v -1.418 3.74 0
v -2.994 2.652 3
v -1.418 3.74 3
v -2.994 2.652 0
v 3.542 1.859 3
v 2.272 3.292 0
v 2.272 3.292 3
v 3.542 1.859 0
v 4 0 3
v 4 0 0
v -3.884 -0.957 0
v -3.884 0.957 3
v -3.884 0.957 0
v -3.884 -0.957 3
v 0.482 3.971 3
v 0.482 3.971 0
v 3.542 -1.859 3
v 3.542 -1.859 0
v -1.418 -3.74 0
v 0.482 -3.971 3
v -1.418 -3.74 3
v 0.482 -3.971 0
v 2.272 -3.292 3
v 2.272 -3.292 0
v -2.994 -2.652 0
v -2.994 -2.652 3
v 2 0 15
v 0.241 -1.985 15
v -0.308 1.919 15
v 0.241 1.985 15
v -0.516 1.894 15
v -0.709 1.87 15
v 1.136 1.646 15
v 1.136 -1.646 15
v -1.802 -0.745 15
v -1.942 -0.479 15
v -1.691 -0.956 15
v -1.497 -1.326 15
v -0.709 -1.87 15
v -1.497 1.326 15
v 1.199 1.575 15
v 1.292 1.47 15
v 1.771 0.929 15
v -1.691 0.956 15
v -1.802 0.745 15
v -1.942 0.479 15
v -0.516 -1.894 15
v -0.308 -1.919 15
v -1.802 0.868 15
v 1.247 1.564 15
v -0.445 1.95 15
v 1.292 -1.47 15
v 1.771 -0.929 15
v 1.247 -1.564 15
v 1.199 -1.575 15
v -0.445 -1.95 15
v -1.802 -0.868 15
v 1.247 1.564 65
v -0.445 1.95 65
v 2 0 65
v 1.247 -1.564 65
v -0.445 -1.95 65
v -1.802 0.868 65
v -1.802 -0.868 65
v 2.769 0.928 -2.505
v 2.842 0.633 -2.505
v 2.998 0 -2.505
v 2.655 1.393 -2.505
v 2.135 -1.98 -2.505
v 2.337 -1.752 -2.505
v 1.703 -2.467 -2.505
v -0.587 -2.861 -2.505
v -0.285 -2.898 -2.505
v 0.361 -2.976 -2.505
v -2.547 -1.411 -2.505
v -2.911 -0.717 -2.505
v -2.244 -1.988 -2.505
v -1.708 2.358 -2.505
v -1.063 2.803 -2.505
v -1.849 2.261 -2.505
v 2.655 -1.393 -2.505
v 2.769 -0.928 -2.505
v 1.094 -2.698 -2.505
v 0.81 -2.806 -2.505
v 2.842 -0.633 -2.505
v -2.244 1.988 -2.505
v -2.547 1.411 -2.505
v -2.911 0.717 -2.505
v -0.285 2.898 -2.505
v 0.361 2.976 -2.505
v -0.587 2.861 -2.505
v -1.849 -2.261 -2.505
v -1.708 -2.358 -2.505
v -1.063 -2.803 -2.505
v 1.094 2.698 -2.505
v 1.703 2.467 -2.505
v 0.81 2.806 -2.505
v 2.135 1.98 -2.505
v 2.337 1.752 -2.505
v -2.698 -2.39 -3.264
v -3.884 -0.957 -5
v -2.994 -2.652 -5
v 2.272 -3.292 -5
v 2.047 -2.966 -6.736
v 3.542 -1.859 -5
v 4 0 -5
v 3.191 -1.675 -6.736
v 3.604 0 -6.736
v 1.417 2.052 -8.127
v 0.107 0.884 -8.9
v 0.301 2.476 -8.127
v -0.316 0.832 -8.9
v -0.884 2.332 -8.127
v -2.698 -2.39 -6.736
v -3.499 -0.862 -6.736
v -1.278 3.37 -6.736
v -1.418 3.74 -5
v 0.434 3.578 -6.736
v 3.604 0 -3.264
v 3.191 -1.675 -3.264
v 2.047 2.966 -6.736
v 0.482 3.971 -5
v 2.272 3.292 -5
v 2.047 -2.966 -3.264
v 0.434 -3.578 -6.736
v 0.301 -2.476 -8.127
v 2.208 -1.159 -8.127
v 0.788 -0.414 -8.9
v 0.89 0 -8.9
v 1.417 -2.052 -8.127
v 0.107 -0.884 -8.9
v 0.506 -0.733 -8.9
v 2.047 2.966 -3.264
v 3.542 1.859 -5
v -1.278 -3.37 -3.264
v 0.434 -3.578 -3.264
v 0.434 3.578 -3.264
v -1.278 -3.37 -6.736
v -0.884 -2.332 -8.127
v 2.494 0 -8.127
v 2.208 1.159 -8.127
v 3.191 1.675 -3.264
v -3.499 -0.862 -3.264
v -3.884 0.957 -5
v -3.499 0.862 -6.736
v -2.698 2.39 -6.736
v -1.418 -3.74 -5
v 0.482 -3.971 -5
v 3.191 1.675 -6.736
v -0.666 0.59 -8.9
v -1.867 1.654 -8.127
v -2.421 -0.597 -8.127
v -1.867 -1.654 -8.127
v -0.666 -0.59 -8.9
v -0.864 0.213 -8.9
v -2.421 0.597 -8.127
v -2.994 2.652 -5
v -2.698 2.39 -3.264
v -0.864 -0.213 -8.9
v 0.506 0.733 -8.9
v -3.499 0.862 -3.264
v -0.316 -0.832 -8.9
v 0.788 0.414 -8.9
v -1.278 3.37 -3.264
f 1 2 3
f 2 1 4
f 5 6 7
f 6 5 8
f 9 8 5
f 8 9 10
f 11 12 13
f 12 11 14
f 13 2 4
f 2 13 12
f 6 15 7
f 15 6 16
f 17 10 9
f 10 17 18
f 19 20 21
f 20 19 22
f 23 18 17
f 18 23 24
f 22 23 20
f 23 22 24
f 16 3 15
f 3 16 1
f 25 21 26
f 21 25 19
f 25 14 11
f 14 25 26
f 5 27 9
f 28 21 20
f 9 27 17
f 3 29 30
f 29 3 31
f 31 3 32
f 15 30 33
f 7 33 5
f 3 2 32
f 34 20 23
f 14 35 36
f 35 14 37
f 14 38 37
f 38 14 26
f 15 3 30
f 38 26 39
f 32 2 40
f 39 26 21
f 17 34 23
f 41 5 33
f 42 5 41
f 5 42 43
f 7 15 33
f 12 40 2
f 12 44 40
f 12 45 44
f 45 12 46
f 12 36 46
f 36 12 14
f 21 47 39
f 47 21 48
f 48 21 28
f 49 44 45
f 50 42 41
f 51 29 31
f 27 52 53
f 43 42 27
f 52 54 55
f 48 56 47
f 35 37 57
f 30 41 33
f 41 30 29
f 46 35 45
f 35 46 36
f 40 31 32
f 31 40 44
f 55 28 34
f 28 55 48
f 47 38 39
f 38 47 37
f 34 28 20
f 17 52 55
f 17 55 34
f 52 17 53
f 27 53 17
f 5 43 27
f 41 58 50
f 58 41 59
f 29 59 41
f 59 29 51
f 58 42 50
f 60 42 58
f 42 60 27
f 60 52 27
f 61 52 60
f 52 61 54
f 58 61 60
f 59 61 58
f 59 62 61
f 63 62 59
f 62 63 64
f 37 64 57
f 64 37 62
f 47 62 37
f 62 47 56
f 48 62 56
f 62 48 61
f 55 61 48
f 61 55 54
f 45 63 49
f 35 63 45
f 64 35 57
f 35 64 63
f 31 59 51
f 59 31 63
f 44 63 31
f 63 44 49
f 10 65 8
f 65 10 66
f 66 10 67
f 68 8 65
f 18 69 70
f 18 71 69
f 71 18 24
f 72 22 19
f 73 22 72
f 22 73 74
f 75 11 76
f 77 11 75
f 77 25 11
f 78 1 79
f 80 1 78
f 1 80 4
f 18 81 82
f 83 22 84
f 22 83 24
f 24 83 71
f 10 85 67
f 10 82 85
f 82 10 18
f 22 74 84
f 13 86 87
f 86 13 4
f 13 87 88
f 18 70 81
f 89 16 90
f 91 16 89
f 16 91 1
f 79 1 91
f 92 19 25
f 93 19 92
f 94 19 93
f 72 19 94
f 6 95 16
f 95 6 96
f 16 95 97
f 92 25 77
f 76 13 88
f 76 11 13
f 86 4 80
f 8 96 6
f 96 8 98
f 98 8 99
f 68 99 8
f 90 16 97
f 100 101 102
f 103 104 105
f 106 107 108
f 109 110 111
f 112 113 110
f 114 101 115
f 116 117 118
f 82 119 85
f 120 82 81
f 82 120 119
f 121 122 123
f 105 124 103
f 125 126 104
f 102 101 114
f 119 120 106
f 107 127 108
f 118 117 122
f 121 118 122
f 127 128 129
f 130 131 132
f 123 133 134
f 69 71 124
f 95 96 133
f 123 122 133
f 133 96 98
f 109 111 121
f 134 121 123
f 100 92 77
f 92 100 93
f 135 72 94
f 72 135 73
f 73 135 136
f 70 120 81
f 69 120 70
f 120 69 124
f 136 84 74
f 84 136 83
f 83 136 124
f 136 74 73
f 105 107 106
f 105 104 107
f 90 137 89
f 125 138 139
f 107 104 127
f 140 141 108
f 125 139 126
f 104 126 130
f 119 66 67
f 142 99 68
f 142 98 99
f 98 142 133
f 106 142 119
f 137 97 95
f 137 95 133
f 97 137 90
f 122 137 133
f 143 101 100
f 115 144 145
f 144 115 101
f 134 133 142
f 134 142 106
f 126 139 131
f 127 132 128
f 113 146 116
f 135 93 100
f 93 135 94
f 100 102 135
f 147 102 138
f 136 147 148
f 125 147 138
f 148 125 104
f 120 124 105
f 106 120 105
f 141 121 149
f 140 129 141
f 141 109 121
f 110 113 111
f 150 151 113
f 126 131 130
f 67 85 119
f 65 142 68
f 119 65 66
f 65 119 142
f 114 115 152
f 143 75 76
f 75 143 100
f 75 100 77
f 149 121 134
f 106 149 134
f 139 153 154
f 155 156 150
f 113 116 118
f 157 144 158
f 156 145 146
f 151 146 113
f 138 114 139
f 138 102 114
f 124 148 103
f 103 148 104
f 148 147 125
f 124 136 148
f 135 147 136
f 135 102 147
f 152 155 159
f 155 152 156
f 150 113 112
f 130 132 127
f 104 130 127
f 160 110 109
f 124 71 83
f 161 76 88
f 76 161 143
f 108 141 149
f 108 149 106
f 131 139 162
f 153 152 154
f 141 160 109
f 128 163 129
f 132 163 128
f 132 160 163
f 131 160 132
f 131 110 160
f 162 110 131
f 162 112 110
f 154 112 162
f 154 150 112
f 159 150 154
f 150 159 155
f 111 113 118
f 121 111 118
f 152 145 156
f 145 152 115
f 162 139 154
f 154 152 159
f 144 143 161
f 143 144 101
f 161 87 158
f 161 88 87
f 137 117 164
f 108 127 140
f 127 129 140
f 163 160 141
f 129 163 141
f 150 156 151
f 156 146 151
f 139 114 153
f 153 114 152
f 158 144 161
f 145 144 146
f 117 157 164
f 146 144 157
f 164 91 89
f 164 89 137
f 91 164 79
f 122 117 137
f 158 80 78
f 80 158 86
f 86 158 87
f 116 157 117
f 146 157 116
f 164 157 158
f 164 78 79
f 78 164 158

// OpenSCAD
//base
cylinder(3,4,4);

    
translate([0,0,3])
{
    cylinder(12,4,2);
}
//stick
translate([0,0,15])
{
    cylinder(50,2,2);
}

//bottom rounded bit
translate([0,0,-5])
{
    cylinder(5,2,4);
}
//sphere at bottom
translate([0,0,-5])
{
    sphere(4);
}
